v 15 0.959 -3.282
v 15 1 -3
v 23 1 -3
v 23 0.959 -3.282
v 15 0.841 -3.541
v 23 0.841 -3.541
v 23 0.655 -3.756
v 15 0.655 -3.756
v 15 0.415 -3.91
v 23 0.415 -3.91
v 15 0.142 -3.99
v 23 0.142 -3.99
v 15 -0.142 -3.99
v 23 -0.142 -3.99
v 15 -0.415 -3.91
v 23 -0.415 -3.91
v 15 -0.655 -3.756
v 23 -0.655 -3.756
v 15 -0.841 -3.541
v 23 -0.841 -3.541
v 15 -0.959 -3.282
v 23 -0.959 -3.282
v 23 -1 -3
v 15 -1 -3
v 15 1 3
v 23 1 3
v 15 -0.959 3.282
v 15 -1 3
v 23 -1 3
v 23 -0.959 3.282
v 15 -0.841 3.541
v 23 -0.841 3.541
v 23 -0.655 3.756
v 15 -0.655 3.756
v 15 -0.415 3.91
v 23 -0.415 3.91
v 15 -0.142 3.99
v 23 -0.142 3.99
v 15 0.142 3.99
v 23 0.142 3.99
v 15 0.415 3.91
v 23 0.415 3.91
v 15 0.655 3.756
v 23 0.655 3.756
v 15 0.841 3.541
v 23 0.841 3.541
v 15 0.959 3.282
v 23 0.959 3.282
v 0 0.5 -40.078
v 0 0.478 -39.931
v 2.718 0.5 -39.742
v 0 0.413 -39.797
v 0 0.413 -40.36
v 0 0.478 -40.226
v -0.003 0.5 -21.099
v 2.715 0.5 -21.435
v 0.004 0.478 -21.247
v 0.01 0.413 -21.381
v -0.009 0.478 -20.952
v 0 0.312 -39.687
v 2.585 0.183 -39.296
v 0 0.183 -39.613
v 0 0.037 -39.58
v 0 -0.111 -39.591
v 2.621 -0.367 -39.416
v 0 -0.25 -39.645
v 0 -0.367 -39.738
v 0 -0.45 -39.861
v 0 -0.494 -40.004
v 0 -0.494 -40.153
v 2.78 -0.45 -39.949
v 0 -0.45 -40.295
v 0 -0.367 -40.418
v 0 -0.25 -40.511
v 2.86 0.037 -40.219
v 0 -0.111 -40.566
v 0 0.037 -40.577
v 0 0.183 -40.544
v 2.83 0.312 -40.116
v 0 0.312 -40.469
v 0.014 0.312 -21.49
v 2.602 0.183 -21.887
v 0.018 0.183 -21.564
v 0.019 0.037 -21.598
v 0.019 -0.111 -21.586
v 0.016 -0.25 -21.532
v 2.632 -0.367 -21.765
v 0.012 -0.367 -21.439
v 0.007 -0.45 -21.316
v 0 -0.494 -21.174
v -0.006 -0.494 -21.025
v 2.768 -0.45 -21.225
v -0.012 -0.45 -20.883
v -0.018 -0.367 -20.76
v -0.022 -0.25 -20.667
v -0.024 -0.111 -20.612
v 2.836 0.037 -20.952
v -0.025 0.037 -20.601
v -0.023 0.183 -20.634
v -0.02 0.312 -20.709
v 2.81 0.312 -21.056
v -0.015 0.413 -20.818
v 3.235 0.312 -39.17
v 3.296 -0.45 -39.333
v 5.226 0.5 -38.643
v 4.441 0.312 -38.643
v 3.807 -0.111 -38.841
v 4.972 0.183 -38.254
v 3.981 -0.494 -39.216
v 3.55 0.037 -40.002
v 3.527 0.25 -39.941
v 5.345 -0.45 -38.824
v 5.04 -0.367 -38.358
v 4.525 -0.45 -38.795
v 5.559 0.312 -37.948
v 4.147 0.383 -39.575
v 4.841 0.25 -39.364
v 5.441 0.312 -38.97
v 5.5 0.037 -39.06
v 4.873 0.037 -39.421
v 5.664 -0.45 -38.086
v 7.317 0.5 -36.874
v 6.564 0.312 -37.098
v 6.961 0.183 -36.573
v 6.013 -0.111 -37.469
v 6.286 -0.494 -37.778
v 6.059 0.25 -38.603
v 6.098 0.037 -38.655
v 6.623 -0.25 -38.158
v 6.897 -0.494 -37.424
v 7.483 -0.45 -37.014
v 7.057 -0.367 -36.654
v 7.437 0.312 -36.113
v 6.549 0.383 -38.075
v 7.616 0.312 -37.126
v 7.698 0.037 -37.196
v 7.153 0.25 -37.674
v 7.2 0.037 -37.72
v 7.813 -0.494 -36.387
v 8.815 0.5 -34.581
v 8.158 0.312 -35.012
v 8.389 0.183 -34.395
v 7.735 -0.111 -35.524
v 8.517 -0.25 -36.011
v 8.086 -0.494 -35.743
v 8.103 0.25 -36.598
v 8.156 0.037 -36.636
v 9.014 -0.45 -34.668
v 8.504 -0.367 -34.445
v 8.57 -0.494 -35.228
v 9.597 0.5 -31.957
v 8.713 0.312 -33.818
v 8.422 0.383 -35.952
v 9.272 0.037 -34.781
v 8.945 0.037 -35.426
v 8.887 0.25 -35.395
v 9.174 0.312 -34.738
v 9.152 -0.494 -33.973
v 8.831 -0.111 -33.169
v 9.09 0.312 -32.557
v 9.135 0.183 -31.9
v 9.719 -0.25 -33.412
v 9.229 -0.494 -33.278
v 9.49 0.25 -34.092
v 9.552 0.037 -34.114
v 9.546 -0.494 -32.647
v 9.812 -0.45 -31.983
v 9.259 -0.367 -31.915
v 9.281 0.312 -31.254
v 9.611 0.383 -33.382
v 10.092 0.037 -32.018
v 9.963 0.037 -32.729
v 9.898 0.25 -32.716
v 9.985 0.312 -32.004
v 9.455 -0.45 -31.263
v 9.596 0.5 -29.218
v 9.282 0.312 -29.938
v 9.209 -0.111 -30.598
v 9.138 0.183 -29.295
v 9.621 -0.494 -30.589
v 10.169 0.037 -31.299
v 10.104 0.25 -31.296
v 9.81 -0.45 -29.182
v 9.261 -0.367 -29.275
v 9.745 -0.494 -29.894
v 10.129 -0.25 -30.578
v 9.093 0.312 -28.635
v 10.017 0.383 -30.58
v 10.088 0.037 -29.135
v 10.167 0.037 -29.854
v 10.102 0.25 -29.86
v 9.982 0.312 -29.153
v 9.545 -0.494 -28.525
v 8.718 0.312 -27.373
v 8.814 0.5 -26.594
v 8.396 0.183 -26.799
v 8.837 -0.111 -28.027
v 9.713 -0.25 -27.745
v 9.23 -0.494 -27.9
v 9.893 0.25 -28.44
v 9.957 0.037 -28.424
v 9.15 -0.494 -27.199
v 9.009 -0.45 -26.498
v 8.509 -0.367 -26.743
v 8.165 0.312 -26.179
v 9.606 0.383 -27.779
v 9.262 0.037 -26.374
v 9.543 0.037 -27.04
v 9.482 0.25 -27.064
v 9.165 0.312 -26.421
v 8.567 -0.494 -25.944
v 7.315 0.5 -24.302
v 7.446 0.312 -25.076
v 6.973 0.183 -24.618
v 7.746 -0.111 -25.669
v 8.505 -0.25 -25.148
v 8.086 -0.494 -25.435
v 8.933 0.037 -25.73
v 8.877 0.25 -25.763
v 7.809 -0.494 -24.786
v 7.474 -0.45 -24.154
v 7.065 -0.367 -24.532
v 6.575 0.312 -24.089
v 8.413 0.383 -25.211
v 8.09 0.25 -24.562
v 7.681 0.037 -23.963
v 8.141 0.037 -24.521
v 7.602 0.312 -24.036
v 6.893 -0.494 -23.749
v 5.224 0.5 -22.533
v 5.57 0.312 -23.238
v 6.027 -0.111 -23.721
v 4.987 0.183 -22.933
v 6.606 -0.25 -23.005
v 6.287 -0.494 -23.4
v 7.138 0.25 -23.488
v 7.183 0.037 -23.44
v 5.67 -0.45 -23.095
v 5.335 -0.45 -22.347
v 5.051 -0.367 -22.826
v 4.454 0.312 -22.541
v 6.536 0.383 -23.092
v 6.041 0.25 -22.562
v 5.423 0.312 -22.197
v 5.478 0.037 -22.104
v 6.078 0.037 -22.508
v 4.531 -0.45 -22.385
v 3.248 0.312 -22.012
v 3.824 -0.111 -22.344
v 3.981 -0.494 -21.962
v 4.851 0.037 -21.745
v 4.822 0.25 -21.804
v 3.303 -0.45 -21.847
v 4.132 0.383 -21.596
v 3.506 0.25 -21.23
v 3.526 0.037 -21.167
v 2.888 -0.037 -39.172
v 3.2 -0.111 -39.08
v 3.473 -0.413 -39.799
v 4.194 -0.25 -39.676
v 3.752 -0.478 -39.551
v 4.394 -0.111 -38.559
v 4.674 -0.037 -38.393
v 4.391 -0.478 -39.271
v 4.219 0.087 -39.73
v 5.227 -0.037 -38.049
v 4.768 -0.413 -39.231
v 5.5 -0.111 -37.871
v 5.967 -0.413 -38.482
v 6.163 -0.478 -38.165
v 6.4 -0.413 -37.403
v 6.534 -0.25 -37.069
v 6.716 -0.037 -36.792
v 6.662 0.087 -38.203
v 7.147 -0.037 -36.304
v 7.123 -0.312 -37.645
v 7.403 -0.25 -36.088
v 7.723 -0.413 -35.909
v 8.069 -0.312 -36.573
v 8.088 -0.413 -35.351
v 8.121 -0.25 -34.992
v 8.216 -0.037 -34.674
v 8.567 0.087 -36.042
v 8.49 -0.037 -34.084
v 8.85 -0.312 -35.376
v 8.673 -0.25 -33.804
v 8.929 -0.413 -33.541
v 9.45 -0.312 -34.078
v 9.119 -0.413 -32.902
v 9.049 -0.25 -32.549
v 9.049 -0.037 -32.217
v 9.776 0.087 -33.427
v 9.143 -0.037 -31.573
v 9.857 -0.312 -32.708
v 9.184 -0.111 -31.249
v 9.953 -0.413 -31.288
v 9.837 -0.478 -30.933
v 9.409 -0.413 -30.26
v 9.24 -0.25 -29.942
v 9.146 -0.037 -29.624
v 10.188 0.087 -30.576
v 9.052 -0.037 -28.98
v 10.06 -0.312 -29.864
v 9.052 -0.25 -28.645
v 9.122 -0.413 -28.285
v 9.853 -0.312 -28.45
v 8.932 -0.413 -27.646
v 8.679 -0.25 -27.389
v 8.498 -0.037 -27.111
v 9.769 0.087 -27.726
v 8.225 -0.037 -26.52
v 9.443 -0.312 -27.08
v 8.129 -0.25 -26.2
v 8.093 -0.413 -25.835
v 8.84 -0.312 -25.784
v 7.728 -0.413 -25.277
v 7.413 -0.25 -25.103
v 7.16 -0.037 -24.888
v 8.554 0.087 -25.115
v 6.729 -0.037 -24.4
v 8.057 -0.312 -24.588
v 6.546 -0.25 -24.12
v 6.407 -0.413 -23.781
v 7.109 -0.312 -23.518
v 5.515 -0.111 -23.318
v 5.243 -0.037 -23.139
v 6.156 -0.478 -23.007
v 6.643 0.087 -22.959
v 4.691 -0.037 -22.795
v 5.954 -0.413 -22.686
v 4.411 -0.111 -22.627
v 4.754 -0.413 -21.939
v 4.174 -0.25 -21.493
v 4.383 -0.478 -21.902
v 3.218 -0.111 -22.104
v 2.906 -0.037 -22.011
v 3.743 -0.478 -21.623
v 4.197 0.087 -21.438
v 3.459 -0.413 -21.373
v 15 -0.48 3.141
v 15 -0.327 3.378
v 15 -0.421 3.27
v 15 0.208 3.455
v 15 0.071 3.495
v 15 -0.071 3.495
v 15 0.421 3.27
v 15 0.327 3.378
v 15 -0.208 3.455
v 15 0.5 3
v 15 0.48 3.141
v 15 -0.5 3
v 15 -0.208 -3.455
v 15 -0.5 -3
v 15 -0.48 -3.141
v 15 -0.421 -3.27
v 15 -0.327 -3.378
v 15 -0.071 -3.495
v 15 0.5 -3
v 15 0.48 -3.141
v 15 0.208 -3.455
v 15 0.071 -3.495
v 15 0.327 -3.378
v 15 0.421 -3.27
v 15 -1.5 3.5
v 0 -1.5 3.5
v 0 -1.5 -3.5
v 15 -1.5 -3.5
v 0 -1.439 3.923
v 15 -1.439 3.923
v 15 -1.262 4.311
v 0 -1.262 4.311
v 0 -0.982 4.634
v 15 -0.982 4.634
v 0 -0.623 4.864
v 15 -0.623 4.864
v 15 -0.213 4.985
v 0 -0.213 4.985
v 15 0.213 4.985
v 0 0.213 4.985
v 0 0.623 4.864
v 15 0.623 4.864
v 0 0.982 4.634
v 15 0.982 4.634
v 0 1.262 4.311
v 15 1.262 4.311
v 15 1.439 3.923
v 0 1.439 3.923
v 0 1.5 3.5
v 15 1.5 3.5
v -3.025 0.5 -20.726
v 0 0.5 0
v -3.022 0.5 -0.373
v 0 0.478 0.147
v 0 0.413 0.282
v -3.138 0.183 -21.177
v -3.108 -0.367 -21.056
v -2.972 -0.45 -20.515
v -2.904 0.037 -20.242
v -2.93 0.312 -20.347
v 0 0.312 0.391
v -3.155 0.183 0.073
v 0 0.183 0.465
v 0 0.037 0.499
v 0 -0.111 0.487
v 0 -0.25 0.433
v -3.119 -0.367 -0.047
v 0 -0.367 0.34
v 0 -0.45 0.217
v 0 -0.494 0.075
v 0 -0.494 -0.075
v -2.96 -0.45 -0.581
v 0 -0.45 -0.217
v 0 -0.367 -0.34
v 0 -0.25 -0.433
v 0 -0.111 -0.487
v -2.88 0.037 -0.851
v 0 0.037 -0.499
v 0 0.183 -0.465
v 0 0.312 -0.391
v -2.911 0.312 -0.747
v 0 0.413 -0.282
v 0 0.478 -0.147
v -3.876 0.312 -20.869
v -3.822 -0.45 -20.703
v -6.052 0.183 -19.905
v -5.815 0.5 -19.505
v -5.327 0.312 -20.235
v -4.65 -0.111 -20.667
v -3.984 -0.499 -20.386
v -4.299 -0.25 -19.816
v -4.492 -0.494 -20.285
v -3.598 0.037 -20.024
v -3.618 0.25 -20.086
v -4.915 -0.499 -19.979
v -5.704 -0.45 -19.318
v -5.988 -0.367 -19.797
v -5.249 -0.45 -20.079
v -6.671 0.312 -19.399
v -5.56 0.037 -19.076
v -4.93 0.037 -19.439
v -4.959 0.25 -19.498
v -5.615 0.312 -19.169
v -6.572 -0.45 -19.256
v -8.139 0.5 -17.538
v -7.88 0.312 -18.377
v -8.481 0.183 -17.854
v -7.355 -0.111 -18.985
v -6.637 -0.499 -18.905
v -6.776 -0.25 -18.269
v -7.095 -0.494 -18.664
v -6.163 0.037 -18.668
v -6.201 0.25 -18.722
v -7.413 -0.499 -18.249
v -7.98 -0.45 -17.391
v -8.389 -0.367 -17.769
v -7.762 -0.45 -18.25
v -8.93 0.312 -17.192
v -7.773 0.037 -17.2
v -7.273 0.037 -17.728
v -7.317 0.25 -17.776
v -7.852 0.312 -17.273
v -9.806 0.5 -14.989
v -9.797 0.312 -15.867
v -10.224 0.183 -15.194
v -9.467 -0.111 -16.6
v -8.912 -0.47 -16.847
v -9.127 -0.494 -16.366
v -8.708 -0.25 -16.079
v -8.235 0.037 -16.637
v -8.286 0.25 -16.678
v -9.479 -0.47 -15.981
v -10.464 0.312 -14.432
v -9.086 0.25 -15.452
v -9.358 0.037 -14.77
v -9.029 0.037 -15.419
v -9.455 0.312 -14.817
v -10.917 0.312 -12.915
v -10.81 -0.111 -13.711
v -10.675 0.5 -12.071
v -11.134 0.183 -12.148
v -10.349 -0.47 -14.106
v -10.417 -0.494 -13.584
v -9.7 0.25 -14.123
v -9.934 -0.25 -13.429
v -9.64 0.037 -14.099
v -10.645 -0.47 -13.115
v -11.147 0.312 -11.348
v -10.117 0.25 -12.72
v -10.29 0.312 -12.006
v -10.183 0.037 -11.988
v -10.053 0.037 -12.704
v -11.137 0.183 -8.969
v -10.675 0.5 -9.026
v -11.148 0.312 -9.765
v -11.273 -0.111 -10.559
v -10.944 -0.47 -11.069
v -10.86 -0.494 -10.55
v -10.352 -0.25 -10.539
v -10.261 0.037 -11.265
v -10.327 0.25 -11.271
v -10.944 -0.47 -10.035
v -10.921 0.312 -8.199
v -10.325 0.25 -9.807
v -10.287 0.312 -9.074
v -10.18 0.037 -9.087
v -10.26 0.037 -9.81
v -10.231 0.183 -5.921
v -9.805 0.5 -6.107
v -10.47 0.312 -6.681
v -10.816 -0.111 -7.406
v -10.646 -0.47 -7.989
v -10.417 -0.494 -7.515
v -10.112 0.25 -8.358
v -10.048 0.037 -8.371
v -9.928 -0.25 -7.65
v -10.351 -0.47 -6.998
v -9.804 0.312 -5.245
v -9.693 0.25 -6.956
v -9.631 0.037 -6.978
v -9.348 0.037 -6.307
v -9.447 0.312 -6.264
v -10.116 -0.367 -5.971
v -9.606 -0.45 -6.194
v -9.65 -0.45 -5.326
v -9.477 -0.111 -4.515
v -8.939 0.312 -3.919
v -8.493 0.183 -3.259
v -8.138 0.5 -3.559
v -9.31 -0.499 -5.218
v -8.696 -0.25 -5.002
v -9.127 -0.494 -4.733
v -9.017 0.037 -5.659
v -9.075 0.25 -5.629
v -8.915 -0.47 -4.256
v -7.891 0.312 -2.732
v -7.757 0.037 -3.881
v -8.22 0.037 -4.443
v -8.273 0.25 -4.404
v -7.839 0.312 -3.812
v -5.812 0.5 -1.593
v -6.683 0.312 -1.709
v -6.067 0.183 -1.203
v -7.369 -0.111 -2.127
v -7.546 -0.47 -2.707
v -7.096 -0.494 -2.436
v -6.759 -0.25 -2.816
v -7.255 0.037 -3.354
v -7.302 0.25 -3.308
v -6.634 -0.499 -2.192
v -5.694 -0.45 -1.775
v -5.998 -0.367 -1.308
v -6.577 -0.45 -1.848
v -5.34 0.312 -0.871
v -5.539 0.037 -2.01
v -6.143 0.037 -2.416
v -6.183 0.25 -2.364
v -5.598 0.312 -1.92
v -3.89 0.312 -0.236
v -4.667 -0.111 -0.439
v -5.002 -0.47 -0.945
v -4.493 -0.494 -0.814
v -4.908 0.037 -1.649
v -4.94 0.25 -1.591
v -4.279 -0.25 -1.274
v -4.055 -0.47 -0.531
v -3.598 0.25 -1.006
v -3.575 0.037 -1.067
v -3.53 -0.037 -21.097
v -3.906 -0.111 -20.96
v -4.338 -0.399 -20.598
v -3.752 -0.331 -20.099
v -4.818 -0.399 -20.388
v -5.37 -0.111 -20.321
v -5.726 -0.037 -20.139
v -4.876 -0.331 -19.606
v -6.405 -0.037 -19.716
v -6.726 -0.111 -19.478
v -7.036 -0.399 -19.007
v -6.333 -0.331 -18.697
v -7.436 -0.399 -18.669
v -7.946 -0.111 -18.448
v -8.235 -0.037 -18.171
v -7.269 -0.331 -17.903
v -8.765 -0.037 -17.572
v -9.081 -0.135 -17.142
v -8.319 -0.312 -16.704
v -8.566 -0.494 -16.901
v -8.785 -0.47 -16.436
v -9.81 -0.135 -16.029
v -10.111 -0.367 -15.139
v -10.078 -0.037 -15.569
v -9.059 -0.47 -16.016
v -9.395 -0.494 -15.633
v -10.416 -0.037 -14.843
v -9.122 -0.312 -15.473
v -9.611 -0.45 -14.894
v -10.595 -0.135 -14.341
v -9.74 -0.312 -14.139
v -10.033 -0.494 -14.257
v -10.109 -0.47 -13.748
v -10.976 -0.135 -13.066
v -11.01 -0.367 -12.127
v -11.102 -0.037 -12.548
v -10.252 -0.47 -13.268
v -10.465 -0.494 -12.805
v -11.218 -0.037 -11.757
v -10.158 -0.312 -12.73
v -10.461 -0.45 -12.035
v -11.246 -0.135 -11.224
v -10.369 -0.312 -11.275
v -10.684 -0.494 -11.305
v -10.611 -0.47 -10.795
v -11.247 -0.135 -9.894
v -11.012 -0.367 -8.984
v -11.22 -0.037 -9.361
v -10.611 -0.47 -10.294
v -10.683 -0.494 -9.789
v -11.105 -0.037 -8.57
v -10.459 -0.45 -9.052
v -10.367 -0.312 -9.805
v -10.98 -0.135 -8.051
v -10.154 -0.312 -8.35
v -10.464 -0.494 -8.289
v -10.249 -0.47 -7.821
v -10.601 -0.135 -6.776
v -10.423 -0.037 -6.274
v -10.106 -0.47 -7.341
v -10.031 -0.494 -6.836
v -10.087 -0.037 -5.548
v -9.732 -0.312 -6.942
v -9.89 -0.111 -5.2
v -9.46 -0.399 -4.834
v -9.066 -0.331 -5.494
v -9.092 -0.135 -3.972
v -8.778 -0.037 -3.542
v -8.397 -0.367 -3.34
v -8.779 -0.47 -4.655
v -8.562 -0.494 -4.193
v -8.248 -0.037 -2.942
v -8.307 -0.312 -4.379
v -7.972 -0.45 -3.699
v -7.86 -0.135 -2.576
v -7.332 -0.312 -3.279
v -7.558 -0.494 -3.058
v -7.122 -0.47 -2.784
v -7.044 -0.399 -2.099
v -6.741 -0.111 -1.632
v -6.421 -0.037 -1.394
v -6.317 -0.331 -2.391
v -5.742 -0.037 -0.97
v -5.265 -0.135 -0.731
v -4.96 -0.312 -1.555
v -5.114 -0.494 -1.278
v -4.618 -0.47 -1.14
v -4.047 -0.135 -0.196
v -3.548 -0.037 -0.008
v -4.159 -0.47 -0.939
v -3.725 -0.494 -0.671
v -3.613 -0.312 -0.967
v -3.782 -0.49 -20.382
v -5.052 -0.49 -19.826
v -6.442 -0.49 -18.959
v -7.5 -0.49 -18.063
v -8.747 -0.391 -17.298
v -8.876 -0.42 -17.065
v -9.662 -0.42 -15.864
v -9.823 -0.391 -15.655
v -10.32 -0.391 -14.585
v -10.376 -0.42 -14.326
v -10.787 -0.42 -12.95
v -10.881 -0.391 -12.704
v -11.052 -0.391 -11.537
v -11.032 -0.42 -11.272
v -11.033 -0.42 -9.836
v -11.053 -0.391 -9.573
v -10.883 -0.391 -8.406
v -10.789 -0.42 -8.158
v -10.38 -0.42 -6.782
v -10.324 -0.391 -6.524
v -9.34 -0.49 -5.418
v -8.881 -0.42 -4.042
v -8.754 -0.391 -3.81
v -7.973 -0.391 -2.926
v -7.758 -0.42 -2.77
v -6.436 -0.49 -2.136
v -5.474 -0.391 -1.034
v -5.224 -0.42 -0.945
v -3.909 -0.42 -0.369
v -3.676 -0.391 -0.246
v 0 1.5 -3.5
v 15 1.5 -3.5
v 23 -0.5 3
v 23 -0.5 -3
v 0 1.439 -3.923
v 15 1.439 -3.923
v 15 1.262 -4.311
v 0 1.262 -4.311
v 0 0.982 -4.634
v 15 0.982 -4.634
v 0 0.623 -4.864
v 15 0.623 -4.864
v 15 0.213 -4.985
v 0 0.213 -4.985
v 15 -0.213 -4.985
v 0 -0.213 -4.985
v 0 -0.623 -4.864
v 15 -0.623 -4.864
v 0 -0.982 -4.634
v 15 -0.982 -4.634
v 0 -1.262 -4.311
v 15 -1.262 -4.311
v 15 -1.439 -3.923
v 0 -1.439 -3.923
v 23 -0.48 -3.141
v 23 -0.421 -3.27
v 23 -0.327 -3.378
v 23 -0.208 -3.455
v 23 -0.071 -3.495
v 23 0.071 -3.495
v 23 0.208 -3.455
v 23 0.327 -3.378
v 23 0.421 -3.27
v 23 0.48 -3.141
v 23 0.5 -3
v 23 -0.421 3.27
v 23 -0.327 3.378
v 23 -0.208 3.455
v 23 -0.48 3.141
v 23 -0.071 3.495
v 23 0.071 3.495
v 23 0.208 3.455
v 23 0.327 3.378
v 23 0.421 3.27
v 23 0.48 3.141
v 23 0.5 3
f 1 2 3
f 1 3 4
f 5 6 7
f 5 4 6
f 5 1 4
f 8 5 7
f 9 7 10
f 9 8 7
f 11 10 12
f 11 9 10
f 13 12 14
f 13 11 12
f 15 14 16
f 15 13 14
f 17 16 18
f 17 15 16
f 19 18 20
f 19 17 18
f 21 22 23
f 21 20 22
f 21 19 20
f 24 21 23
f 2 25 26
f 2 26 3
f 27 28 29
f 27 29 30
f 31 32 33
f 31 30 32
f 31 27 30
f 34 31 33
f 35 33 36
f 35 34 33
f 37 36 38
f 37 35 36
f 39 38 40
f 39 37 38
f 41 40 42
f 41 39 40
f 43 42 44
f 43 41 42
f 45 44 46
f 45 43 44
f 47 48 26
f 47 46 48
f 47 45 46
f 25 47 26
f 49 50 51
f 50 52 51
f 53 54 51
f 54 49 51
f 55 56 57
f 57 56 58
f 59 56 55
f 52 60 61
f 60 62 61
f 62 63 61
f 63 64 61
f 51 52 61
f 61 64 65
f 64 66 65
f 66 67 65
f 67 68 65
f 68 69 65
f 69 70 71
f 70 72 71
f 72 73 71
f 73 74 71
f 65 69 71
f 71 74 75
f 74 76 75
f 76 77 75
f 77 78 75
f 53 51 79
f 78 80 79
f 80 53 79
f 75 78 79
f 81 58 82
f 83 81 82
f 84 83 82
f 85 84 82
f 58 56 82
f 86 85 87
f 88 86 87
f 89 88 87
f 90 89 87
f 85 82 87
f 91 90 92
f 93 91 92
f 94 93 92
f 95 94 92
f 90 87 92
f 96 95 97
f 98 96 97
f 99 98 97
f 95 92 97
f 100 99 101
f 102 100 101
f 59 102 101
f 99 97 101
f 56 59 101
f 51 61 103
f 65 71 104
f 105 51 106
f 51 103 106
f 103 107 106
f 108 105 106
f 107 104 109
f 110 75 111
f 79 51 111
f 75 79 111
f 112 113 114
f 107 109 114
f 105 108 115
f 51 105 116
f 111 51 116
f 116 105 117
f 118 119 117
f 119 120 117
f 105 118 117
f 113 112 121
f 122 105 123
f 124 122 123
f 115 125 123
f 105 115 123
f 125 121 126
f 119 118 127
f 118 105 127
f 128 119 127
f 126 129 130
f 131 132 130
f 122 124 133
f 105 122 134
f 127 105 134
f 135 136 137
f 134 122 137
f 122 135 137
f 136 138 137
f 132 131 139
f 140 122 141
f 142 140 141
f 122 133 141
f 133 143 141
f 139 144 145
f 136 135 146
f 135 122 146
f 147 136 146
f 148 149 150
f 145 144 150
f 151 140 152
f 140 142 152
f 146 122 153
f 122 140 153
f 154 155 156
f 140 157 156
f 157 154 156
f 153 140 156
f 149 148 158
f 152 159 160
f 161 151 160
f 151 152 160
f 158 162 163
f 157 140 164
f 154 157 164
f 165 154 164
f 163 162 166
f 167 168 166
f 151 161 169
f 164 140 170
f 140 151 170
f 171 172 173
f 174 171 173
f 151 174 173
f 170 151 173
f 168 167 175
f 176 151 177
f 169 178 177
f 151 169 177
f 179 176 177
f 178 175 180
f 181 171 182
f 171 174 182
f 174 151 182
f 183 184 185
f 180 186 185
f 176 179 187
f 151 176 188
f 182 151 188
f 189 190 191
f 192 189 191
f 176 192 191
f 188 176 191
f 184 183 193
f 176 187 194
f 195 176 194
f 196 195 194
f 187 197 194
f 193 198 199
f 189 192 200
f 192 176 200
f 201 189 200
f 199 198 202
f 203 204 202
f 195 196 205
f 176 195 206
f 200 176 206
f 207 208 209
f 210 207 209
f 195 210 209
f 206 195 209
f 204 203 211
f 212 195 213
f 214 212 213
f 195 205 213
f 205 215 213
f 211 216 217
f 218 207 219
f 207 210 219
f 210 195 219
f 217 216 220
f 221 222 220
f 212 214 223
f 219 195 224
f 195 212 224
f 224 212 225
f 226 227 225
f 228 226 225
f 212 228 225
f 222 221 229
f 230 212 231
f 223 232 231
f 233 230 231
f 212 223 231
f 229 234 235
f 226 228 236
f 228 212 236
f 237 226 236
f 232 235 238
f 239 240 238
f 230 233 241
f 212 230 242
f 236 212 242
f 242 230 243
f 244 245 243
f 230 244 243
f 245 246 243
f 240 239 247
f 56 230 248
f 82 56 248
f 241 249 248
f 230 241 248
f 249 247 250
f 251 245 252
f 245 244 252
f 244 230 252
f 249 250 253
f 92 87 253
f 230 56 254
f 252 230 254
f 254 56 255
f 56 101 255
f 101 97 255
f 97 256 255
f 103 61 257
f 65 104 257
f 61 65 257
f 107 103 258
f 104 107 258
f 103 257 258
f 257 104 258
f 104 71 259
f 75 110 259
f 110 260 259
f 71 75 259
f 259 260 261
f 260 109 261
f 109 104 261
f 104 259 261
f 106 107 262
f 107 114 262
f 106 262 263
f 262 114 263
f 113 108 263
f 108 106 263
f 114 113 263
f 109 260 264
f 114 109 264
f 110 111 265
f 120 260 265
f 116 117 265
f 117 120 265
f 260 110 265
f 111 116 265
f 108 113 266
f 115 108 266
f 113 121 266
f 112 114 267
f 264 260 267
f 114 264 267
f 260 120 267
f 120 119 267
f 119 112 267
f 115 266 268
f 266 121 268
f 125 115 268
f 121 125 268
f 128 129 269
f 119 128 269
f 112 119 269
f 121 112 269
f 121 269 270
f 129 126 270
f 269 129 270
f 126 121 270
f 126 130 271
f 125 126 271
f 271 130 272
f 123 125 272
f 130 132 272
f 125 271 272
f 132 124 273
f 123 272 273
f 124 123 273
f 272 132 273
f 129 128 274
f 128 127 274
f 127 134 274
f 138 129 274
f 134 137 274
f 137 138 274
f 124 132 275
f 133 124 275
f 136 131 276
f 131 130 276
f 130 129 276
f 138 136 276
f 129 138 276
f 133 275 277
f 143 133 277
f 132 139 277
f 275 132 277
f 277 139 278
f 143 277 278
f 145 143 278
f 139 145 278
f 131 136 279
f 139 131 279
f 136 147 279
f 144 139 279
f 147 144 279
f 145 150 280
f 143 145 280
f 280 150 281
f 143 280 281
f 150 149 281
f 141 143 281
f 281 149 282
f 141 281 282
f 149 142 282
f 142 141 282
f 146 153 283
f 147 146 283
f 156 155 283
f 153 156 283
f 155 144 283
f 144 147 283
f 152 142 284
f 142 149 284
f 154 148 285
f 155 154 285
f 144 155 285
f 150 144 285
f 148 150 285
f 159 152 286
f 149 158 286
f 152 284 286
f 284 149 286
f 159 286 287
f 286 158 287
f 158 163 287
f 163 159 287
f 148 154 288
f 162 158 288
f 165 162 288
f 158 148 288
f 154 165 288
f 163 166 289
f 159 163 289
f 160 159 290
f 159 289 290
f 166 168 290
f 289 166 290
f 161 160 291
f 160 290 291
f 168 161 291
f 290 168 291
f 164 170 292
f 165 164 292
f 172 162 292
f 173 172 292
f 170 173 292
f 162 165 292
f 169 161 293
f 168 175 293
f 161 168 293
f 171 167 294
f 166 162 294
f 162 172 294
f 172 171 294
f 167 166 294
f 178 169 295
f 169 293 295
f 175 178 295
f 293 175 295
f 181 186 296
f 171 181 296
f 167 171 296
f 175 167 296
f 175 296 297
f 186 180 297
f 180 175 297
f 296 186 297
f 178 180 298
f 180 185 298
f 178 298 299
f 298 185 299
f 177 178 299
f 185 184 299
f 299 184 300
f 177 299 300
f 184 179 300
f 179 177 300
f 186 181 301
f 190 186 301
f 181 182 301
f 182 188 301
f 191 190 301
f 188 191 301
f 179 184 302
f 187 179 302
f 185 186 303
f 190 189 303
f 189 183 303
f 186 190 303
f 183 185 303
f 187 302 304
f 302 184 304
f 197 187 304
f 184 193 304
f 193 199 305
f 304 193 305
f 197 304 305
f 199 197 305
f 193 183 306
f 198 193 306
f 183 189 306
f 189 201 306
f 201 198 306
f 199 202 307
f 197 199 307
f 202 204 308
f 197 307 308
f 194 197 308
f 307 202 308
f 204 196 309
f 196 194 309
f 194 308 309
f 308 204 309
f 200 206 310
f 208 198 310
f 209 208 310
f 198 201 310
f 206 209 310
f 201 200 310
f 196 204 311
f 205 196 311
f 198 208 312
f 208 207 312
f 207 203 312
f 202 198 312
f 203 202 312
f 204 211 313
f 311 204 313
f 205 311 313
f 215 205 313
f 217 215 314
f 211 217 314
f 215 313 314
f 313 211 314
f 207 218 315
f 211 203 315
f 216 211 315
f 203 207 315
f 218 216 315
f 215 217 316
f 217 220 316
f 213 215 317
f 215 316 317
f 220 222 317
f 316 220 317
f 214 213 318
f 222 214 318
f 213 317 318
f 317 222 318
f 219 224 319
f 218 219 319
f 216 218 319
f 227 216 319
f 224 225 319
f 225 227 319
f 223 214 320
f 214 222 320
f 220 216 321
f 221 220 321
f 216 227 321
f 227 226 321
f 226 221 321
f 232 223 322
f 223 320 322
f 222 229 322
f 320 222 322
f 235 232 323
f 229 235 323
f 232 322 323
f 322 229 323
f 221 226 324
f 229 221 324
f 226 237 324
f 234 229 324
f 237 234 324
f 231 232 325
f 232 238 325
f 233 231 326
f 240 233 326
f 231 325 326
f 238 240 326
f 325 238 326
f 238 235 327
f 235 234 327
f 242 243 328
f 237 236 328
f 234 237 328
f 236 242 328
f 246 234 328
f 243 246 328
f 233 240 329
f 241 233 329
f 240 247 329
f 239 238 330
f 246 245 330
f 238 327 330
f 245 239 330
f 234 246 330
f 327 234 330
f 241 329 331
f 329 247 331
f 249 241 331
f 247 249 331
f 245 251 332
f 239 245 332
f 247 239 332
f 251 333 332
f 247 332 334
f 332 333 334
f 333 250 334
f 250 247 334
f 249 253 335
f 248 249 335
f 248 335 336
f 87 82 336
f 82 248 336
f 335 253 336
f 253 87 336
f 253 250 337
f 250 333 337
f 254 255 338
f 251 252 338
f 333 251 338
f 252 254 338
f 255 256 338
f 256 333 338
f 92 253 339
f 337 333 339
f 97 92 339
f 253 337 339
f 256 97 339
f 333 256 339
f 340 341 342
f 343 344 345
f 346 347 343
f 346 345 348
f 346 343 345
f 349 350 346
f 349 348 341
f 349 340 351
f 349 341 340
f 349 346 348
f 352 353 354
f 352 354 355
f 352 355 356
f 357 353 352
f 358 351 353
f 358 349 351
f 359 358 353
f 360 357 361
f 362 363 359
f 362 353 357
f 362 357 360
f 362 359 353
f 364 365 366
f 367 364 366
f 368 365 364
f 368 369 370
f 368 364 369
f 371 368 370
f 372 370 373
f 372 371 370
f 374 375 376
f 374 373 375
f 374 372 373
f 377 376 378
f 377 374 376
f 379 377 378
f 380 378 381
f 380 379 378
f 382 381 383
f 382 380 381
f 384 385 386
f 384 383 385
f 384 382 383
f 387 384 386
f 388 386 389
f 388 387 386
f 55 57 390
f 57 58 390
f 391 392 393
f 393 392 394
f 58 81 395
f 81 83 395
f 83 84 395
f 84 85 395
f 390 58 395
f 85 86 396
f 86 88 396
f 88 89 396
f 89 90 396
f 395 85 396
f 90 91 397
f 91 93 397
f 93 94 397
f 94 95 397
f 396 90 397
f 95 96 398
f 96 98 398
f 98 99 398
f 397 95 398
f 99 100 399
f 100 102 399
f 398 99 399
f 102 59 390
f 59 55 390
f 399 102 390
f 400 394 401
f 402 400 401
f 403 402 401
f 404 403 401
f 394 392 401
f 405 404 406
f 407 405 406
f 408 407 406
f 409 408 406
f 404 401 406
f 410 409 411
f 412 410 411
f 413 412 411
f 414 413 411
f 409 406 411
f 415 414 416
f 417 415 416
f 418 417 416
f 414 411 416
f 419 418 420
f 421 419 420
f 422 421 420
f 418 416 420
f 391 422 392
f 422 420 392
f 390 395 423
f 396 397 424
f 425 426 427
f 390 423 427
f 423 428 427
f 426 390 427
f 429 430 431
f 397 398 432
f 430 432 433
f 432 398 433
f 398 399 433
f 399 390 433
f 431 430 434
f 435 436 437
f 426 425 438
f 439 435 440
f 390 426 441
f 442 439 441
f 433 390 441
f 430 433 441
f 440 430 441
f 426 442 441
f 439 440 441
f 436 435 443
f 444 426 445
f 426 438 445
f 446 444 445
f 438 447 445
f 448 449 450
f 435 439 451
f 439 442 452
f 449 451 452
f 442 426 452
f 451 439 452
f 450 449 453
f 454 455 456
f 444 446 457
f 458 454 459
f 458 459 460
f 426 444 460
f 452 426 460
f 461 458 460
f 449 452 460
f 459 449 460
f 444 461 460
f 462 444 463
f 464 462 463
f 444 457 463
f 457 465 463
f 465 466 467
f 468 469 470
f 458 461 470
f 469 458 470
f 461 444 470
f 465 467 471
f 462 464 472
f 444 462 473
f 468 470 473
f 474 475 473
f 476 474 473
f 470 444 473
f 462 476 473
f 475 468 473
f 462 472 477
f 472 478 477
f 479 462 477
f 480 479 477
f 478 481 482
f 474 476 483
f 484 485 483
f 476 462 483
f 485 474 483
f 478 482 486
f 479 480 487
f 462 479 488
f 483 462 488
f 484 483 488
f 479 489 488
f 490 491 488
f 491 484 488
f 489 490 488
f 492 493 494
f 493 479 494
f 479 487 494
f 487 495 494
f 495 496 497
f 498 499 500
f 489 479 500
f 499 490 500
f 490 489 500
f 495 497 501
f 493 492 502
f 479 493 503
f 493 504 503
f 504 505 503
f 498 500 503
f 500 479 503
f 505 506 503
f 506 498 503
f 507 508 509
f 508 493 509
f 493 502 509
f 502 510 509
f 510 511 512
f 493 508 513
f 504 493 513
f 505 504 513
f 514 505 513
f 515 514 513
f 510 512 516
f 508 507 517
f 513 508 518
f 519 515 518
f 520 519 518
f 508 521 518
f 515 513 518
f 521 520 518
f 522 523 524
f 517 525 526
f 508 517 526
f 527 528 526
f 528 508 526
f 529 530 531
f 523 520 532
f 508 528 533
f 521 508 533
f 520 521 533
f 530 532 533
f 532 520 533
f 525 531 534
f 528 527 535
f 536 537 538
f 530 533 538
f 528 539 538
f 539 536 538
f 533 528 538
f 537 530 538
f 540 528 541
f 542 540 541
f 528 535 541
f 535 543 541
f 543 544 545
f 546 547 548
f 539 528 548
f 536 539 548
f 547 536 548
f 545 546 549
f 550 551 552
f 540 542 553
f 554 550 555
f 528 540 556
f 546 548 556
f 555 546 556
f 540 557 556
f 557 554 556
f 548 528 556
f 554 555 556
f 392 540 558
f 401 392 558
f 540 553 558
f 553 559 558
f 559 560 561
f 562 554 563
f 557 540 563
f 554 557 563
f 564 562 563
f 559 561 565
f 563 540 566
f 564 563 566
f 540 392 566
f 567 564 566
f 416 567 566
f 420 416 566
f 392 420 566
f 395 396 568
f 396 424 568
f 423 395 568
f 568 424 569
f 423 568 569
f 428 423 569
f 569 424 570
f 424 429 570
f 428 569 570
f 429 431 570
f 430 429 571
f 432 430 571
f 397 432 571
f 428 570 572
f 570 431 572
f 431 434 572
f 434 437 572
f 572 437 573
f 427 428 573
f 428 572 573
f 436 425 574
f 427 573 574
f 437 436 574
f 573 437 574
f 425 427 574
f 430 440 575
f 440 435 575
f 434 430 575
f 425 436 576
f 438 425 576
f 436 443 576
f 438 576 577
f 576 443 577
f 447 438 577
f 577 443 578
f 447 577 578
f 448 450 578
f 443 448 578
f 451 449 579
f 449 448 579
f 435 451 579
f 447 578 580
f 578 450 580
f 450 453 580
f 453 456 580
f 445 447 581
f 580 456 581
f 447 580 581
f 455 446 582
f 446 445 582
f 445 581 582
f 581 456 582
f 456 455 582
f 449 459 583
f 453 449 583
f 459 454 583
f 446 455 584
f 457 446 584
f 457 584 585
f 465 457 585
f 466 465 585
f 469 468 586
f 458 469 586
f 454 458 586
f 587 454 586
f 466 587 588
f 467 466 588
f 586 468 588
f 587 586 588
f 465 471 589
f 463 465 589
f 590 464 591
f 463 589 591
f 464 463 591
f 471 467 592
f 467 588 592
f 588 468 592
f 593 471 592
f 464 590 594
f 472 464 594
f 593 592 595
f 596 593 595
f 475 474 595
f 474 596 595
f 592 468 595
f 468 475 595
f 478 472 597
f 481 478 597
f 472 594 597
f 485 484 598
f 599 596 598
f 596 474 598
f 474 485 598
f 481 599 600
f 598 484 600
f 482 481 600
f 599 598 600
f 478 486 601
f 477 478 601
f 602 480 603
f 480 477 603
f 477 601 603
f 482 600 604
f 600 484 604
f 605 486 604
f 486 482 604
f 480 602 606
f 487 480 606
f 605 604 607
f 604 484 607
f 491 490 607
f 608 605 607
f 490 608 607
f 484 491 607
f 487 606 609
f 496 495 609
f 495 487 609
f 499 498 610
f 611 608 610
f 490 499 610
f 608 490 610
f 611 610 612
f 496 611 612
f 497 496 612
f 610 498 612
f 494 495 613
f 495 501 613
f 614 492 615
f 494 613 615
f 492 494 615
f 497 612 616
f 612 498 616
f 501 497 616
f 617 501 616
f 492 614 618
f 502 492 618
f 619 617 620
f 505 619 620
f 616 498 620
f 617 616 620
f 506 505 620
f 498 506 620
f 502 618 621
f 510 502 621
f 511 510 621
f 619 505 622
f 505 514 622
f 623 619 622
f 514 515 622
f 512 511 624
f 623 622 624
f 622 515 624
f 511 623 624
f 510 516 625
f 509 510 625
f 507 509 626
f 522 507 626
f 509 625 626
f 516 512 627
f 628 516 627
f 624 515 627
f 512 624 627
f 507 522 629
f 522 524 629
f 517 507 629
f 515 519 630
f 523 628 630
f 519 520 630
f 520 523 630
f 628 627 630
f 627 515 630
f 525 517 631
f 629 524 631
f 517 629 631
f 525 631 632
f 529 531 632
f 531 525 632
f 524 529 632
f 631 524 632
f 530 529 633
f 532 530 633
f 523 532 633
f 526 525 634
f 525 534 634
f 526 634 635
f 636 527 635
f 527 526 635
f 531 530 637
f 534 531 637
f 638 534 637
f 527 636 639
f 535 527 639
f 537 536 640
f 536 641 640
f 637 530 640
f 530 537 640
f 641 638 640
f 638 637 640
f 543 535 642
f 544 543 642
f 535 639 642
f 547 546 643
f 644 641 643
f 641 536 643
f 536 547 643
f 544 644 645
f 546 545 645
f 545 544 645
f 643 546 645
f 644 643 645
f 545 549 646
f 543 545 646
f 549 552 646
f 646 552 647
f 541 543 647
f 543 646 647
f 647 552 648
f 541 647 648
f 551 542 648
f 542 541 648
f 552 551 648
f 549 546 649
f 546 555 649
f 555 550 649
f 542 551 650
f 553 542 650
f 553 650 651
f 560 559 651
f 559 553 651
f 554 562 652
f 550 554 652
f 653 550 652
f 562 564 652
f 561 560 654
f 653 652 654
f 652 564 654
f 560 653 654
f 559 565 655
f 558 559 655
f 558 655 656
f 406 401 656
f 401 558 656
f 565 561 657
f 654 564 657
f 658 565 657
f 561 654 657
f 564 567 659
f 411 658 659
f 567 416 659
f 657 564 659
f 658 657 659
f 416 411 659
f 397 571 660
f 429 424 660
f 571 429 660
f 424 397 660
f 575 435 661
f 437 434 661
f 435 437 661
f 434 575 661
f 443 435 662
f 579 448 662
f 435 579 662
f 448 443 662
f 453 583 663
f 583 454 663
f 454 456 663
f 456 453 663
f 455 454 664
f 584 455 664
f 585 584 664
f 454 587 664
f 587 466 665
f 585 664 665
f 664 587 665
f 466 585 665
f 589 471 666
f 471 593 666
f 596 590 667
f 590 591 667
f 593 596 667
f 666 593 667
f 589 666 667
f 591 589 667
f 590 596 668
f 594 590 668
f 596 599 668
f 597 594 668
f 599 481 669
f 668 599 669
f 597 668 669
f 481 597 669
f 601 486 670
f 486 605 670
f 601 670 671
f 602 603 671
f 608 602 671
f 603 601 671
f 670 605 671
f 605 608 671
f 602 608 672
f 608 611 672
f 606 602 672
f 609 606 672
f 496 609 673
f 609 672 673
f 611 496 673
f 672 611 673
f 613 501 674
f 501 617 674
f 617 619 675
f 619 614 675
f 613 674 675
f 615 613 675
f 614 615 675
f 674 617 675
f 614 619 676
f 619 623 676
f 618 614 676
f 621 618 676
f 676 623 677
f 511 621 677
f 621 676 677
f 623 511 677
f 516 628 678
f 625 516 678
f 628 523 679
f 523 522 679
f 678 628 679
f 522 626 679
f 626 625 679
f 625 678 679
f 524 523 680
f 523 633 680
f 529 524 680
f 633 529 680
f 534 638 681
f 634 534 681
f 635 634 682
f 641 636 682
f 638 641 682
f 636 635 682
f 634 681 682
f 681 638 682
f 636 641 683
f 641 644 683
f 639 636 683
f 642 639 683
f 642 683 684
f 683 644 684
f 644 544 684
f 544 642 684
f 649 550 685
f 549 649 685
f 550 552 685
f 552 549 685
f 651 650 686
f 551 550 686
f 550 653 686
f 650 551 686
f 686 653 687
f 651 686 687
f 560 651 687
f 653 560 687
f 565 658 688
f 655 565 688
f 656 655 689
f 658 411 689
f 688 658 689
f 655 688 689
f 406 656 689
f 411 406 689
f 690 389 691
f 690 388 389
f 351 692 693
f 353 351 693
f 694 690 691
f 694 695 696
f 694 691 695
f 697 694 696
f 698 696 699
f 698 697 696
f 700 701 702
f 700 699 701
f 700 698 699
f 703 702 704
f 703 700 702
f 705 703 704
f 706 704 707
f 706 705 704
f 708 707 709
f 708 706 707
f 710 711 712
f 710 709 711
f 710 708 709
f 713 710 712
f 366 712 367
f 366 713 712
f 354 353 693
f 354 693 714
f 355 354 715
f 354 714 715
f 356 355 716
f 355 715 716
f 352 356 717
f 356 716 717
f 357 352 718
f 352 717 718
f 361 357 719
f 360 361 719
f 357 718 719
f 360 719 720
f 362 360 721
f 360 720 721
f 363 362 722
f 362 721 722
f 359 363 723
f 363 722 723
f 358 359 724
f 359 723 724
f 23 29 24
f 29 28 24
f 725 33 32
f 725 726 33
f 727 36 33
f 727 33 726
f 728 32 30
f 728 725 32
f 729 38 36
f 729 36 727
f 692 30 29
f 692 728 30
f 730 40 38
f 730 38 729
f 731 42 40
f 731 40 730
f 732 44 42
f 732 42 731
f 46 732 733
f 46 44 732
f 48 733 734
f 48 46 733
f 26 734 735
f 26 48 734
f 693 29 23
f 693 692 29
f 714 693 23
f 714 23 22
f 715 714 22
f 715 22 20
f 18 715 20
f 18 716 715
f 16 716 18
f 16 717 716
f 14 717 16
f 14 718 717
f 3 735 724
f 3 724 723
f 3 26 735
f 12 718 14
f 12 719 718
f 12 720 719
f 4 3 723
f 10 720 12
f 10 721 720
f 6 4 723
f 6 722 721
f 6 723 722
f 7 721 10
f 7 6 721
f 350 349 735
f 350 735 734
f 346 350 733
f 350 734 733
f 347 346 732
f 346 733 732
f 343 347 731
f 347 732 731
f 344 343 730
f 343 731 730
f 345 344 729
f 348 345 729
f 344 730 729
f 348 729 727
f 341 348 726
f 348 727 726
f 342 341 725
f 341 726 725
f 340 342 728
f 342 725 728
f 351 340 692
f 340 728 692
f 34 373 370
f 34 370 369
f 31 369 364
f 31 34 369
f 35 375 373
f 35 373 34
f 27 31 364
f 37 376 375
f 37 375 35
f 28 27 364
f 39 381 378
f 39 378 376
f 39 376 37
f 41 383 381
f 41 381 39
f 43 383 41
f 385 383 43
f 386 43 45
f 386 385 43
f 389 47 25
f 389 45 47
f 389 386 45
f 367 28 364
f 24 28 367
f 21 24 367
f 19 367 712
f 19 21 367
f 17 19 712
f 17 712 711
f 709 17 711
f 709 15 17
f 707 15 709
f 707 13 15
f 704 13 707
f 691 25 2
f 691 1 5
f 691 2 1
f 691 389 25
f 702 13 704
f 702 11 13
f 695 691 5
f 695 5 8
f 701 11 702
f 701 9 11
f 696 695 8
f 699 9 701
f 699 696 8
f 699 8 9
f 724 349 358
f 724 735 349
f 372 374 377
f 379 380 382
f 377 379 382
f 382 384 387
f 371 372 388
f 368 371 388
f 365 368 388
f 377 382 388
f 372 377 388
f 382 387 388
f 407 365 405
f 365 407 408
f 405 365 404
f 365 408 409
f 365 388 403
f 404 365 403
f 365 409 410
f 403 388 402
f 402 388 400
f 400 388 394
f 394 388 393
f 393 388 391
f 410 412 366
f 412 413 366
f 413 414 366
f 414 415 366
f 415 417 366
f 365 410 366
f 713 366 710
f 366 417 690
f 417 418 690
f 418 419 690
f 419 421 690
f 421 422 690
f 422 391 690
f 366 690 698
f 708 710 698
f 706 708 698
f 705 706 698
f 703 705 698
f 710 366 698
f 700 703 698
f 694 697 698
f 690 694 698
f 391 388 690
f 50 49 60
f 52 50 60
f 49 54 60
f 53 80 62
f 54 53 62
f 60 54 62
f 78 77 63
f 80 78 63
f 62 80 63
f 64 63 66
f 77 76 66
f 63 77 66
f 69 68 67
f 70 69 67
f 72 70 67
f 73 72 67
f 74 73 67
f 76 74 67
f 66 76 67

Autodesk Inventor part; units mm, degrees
ref_plane "YZ Plane" through (0, 0, 0) normal (1, 0, 0) x (0, 1, 0)
ref_plane "XZ Plane" through (0, 0, 0) normal (0, 1, 0) x (-1, 0, 0)
ref_plane "XY Plane" through (0, 0, 0) normal (0, 0, 1) x (1, 0, 0)
sketch "스케치1" plane through (0, 0, 0) normal (0, 1, 0) x (-1, 0, 0)
  arc A0 (0.0028, -21.0994) -> (0, 0) centre (0.2331, -10.5497) ccw
  arc A1 (0.0028, -21.0994) -> (0, -40.0782) centre (-0.2043, -30.5888) ccw
sketch "스케치2" plane through (0, 0, 0) normal (1, 0, 0) x (0, 1, 0)
  circle A0 centre (0, 0) radius 0.5
  dimension "d0" = 1
sweep "스윕1" add profiles "스케치2" path "스케치1"
sketch "스케치3" plane through (0, 0, 0) normal (1, 0, 0) x (0, 0, -1)
  arc A0 (-3.5, 1.5) -> (-3.5, -1.5) centre (-3.5, 0) ccw
  arc A1 (3.5, -1.5) -> (3.5, 1.5) centre (3.5, 0) ccw
  line L0 (-3.5, 1.5) -> (3.5, 1.5)
  line L1 (-3.5, -1.5) -> (3.5, -1.5)
  point P0 (0, 0)
  dimension "d6" = 3
  dimension "d7" = 3
extrude "돌출1" add sketch "스케치3" along normal blind 15
sketch "스케치4" plane through (15, 0, 0) normal (1, 0, 0) x (0, 0, -1)
  arc A0 (-3, 1) -> (-3, -1) centre (-3, 0) ccw
  arc A1 (3, -1) -> (3, 1) centre (3, 0) ccw
  line L0 (-3, 1) -> (3, 1)
  line L1 (-3, -1) -> (3, -1)
  point P0 (0, 0)
extrude "돌출2" add sketch "스케치4" along normal blind 8
sketch "스케치5" plane through (23, 0, 0) normal (1, 0, 0) x (0, 0, -1)
  arc A0 (-3, 0.5) -> (-3, -0.5) centre (-3, 0) ccw
  arc A1 (3, -0.5) -> (3, 0.5) centre (3, 0) ccw
  line L0 (-0.0026, 0.5) -> (21.1019, 0.5) projected
  line L1 (-3, 0.5) -> (3, 0.5)
  line L2 (-3, -0.5) -> (3, -0.5)
  point P0 (0, 0.5)
  point P1 (0, 0)
  point P2 (21.0994, 0.5)
extrude "돌출3" cut sketch "스케치5" against normal blind 8
properties part number "ctype charger"
